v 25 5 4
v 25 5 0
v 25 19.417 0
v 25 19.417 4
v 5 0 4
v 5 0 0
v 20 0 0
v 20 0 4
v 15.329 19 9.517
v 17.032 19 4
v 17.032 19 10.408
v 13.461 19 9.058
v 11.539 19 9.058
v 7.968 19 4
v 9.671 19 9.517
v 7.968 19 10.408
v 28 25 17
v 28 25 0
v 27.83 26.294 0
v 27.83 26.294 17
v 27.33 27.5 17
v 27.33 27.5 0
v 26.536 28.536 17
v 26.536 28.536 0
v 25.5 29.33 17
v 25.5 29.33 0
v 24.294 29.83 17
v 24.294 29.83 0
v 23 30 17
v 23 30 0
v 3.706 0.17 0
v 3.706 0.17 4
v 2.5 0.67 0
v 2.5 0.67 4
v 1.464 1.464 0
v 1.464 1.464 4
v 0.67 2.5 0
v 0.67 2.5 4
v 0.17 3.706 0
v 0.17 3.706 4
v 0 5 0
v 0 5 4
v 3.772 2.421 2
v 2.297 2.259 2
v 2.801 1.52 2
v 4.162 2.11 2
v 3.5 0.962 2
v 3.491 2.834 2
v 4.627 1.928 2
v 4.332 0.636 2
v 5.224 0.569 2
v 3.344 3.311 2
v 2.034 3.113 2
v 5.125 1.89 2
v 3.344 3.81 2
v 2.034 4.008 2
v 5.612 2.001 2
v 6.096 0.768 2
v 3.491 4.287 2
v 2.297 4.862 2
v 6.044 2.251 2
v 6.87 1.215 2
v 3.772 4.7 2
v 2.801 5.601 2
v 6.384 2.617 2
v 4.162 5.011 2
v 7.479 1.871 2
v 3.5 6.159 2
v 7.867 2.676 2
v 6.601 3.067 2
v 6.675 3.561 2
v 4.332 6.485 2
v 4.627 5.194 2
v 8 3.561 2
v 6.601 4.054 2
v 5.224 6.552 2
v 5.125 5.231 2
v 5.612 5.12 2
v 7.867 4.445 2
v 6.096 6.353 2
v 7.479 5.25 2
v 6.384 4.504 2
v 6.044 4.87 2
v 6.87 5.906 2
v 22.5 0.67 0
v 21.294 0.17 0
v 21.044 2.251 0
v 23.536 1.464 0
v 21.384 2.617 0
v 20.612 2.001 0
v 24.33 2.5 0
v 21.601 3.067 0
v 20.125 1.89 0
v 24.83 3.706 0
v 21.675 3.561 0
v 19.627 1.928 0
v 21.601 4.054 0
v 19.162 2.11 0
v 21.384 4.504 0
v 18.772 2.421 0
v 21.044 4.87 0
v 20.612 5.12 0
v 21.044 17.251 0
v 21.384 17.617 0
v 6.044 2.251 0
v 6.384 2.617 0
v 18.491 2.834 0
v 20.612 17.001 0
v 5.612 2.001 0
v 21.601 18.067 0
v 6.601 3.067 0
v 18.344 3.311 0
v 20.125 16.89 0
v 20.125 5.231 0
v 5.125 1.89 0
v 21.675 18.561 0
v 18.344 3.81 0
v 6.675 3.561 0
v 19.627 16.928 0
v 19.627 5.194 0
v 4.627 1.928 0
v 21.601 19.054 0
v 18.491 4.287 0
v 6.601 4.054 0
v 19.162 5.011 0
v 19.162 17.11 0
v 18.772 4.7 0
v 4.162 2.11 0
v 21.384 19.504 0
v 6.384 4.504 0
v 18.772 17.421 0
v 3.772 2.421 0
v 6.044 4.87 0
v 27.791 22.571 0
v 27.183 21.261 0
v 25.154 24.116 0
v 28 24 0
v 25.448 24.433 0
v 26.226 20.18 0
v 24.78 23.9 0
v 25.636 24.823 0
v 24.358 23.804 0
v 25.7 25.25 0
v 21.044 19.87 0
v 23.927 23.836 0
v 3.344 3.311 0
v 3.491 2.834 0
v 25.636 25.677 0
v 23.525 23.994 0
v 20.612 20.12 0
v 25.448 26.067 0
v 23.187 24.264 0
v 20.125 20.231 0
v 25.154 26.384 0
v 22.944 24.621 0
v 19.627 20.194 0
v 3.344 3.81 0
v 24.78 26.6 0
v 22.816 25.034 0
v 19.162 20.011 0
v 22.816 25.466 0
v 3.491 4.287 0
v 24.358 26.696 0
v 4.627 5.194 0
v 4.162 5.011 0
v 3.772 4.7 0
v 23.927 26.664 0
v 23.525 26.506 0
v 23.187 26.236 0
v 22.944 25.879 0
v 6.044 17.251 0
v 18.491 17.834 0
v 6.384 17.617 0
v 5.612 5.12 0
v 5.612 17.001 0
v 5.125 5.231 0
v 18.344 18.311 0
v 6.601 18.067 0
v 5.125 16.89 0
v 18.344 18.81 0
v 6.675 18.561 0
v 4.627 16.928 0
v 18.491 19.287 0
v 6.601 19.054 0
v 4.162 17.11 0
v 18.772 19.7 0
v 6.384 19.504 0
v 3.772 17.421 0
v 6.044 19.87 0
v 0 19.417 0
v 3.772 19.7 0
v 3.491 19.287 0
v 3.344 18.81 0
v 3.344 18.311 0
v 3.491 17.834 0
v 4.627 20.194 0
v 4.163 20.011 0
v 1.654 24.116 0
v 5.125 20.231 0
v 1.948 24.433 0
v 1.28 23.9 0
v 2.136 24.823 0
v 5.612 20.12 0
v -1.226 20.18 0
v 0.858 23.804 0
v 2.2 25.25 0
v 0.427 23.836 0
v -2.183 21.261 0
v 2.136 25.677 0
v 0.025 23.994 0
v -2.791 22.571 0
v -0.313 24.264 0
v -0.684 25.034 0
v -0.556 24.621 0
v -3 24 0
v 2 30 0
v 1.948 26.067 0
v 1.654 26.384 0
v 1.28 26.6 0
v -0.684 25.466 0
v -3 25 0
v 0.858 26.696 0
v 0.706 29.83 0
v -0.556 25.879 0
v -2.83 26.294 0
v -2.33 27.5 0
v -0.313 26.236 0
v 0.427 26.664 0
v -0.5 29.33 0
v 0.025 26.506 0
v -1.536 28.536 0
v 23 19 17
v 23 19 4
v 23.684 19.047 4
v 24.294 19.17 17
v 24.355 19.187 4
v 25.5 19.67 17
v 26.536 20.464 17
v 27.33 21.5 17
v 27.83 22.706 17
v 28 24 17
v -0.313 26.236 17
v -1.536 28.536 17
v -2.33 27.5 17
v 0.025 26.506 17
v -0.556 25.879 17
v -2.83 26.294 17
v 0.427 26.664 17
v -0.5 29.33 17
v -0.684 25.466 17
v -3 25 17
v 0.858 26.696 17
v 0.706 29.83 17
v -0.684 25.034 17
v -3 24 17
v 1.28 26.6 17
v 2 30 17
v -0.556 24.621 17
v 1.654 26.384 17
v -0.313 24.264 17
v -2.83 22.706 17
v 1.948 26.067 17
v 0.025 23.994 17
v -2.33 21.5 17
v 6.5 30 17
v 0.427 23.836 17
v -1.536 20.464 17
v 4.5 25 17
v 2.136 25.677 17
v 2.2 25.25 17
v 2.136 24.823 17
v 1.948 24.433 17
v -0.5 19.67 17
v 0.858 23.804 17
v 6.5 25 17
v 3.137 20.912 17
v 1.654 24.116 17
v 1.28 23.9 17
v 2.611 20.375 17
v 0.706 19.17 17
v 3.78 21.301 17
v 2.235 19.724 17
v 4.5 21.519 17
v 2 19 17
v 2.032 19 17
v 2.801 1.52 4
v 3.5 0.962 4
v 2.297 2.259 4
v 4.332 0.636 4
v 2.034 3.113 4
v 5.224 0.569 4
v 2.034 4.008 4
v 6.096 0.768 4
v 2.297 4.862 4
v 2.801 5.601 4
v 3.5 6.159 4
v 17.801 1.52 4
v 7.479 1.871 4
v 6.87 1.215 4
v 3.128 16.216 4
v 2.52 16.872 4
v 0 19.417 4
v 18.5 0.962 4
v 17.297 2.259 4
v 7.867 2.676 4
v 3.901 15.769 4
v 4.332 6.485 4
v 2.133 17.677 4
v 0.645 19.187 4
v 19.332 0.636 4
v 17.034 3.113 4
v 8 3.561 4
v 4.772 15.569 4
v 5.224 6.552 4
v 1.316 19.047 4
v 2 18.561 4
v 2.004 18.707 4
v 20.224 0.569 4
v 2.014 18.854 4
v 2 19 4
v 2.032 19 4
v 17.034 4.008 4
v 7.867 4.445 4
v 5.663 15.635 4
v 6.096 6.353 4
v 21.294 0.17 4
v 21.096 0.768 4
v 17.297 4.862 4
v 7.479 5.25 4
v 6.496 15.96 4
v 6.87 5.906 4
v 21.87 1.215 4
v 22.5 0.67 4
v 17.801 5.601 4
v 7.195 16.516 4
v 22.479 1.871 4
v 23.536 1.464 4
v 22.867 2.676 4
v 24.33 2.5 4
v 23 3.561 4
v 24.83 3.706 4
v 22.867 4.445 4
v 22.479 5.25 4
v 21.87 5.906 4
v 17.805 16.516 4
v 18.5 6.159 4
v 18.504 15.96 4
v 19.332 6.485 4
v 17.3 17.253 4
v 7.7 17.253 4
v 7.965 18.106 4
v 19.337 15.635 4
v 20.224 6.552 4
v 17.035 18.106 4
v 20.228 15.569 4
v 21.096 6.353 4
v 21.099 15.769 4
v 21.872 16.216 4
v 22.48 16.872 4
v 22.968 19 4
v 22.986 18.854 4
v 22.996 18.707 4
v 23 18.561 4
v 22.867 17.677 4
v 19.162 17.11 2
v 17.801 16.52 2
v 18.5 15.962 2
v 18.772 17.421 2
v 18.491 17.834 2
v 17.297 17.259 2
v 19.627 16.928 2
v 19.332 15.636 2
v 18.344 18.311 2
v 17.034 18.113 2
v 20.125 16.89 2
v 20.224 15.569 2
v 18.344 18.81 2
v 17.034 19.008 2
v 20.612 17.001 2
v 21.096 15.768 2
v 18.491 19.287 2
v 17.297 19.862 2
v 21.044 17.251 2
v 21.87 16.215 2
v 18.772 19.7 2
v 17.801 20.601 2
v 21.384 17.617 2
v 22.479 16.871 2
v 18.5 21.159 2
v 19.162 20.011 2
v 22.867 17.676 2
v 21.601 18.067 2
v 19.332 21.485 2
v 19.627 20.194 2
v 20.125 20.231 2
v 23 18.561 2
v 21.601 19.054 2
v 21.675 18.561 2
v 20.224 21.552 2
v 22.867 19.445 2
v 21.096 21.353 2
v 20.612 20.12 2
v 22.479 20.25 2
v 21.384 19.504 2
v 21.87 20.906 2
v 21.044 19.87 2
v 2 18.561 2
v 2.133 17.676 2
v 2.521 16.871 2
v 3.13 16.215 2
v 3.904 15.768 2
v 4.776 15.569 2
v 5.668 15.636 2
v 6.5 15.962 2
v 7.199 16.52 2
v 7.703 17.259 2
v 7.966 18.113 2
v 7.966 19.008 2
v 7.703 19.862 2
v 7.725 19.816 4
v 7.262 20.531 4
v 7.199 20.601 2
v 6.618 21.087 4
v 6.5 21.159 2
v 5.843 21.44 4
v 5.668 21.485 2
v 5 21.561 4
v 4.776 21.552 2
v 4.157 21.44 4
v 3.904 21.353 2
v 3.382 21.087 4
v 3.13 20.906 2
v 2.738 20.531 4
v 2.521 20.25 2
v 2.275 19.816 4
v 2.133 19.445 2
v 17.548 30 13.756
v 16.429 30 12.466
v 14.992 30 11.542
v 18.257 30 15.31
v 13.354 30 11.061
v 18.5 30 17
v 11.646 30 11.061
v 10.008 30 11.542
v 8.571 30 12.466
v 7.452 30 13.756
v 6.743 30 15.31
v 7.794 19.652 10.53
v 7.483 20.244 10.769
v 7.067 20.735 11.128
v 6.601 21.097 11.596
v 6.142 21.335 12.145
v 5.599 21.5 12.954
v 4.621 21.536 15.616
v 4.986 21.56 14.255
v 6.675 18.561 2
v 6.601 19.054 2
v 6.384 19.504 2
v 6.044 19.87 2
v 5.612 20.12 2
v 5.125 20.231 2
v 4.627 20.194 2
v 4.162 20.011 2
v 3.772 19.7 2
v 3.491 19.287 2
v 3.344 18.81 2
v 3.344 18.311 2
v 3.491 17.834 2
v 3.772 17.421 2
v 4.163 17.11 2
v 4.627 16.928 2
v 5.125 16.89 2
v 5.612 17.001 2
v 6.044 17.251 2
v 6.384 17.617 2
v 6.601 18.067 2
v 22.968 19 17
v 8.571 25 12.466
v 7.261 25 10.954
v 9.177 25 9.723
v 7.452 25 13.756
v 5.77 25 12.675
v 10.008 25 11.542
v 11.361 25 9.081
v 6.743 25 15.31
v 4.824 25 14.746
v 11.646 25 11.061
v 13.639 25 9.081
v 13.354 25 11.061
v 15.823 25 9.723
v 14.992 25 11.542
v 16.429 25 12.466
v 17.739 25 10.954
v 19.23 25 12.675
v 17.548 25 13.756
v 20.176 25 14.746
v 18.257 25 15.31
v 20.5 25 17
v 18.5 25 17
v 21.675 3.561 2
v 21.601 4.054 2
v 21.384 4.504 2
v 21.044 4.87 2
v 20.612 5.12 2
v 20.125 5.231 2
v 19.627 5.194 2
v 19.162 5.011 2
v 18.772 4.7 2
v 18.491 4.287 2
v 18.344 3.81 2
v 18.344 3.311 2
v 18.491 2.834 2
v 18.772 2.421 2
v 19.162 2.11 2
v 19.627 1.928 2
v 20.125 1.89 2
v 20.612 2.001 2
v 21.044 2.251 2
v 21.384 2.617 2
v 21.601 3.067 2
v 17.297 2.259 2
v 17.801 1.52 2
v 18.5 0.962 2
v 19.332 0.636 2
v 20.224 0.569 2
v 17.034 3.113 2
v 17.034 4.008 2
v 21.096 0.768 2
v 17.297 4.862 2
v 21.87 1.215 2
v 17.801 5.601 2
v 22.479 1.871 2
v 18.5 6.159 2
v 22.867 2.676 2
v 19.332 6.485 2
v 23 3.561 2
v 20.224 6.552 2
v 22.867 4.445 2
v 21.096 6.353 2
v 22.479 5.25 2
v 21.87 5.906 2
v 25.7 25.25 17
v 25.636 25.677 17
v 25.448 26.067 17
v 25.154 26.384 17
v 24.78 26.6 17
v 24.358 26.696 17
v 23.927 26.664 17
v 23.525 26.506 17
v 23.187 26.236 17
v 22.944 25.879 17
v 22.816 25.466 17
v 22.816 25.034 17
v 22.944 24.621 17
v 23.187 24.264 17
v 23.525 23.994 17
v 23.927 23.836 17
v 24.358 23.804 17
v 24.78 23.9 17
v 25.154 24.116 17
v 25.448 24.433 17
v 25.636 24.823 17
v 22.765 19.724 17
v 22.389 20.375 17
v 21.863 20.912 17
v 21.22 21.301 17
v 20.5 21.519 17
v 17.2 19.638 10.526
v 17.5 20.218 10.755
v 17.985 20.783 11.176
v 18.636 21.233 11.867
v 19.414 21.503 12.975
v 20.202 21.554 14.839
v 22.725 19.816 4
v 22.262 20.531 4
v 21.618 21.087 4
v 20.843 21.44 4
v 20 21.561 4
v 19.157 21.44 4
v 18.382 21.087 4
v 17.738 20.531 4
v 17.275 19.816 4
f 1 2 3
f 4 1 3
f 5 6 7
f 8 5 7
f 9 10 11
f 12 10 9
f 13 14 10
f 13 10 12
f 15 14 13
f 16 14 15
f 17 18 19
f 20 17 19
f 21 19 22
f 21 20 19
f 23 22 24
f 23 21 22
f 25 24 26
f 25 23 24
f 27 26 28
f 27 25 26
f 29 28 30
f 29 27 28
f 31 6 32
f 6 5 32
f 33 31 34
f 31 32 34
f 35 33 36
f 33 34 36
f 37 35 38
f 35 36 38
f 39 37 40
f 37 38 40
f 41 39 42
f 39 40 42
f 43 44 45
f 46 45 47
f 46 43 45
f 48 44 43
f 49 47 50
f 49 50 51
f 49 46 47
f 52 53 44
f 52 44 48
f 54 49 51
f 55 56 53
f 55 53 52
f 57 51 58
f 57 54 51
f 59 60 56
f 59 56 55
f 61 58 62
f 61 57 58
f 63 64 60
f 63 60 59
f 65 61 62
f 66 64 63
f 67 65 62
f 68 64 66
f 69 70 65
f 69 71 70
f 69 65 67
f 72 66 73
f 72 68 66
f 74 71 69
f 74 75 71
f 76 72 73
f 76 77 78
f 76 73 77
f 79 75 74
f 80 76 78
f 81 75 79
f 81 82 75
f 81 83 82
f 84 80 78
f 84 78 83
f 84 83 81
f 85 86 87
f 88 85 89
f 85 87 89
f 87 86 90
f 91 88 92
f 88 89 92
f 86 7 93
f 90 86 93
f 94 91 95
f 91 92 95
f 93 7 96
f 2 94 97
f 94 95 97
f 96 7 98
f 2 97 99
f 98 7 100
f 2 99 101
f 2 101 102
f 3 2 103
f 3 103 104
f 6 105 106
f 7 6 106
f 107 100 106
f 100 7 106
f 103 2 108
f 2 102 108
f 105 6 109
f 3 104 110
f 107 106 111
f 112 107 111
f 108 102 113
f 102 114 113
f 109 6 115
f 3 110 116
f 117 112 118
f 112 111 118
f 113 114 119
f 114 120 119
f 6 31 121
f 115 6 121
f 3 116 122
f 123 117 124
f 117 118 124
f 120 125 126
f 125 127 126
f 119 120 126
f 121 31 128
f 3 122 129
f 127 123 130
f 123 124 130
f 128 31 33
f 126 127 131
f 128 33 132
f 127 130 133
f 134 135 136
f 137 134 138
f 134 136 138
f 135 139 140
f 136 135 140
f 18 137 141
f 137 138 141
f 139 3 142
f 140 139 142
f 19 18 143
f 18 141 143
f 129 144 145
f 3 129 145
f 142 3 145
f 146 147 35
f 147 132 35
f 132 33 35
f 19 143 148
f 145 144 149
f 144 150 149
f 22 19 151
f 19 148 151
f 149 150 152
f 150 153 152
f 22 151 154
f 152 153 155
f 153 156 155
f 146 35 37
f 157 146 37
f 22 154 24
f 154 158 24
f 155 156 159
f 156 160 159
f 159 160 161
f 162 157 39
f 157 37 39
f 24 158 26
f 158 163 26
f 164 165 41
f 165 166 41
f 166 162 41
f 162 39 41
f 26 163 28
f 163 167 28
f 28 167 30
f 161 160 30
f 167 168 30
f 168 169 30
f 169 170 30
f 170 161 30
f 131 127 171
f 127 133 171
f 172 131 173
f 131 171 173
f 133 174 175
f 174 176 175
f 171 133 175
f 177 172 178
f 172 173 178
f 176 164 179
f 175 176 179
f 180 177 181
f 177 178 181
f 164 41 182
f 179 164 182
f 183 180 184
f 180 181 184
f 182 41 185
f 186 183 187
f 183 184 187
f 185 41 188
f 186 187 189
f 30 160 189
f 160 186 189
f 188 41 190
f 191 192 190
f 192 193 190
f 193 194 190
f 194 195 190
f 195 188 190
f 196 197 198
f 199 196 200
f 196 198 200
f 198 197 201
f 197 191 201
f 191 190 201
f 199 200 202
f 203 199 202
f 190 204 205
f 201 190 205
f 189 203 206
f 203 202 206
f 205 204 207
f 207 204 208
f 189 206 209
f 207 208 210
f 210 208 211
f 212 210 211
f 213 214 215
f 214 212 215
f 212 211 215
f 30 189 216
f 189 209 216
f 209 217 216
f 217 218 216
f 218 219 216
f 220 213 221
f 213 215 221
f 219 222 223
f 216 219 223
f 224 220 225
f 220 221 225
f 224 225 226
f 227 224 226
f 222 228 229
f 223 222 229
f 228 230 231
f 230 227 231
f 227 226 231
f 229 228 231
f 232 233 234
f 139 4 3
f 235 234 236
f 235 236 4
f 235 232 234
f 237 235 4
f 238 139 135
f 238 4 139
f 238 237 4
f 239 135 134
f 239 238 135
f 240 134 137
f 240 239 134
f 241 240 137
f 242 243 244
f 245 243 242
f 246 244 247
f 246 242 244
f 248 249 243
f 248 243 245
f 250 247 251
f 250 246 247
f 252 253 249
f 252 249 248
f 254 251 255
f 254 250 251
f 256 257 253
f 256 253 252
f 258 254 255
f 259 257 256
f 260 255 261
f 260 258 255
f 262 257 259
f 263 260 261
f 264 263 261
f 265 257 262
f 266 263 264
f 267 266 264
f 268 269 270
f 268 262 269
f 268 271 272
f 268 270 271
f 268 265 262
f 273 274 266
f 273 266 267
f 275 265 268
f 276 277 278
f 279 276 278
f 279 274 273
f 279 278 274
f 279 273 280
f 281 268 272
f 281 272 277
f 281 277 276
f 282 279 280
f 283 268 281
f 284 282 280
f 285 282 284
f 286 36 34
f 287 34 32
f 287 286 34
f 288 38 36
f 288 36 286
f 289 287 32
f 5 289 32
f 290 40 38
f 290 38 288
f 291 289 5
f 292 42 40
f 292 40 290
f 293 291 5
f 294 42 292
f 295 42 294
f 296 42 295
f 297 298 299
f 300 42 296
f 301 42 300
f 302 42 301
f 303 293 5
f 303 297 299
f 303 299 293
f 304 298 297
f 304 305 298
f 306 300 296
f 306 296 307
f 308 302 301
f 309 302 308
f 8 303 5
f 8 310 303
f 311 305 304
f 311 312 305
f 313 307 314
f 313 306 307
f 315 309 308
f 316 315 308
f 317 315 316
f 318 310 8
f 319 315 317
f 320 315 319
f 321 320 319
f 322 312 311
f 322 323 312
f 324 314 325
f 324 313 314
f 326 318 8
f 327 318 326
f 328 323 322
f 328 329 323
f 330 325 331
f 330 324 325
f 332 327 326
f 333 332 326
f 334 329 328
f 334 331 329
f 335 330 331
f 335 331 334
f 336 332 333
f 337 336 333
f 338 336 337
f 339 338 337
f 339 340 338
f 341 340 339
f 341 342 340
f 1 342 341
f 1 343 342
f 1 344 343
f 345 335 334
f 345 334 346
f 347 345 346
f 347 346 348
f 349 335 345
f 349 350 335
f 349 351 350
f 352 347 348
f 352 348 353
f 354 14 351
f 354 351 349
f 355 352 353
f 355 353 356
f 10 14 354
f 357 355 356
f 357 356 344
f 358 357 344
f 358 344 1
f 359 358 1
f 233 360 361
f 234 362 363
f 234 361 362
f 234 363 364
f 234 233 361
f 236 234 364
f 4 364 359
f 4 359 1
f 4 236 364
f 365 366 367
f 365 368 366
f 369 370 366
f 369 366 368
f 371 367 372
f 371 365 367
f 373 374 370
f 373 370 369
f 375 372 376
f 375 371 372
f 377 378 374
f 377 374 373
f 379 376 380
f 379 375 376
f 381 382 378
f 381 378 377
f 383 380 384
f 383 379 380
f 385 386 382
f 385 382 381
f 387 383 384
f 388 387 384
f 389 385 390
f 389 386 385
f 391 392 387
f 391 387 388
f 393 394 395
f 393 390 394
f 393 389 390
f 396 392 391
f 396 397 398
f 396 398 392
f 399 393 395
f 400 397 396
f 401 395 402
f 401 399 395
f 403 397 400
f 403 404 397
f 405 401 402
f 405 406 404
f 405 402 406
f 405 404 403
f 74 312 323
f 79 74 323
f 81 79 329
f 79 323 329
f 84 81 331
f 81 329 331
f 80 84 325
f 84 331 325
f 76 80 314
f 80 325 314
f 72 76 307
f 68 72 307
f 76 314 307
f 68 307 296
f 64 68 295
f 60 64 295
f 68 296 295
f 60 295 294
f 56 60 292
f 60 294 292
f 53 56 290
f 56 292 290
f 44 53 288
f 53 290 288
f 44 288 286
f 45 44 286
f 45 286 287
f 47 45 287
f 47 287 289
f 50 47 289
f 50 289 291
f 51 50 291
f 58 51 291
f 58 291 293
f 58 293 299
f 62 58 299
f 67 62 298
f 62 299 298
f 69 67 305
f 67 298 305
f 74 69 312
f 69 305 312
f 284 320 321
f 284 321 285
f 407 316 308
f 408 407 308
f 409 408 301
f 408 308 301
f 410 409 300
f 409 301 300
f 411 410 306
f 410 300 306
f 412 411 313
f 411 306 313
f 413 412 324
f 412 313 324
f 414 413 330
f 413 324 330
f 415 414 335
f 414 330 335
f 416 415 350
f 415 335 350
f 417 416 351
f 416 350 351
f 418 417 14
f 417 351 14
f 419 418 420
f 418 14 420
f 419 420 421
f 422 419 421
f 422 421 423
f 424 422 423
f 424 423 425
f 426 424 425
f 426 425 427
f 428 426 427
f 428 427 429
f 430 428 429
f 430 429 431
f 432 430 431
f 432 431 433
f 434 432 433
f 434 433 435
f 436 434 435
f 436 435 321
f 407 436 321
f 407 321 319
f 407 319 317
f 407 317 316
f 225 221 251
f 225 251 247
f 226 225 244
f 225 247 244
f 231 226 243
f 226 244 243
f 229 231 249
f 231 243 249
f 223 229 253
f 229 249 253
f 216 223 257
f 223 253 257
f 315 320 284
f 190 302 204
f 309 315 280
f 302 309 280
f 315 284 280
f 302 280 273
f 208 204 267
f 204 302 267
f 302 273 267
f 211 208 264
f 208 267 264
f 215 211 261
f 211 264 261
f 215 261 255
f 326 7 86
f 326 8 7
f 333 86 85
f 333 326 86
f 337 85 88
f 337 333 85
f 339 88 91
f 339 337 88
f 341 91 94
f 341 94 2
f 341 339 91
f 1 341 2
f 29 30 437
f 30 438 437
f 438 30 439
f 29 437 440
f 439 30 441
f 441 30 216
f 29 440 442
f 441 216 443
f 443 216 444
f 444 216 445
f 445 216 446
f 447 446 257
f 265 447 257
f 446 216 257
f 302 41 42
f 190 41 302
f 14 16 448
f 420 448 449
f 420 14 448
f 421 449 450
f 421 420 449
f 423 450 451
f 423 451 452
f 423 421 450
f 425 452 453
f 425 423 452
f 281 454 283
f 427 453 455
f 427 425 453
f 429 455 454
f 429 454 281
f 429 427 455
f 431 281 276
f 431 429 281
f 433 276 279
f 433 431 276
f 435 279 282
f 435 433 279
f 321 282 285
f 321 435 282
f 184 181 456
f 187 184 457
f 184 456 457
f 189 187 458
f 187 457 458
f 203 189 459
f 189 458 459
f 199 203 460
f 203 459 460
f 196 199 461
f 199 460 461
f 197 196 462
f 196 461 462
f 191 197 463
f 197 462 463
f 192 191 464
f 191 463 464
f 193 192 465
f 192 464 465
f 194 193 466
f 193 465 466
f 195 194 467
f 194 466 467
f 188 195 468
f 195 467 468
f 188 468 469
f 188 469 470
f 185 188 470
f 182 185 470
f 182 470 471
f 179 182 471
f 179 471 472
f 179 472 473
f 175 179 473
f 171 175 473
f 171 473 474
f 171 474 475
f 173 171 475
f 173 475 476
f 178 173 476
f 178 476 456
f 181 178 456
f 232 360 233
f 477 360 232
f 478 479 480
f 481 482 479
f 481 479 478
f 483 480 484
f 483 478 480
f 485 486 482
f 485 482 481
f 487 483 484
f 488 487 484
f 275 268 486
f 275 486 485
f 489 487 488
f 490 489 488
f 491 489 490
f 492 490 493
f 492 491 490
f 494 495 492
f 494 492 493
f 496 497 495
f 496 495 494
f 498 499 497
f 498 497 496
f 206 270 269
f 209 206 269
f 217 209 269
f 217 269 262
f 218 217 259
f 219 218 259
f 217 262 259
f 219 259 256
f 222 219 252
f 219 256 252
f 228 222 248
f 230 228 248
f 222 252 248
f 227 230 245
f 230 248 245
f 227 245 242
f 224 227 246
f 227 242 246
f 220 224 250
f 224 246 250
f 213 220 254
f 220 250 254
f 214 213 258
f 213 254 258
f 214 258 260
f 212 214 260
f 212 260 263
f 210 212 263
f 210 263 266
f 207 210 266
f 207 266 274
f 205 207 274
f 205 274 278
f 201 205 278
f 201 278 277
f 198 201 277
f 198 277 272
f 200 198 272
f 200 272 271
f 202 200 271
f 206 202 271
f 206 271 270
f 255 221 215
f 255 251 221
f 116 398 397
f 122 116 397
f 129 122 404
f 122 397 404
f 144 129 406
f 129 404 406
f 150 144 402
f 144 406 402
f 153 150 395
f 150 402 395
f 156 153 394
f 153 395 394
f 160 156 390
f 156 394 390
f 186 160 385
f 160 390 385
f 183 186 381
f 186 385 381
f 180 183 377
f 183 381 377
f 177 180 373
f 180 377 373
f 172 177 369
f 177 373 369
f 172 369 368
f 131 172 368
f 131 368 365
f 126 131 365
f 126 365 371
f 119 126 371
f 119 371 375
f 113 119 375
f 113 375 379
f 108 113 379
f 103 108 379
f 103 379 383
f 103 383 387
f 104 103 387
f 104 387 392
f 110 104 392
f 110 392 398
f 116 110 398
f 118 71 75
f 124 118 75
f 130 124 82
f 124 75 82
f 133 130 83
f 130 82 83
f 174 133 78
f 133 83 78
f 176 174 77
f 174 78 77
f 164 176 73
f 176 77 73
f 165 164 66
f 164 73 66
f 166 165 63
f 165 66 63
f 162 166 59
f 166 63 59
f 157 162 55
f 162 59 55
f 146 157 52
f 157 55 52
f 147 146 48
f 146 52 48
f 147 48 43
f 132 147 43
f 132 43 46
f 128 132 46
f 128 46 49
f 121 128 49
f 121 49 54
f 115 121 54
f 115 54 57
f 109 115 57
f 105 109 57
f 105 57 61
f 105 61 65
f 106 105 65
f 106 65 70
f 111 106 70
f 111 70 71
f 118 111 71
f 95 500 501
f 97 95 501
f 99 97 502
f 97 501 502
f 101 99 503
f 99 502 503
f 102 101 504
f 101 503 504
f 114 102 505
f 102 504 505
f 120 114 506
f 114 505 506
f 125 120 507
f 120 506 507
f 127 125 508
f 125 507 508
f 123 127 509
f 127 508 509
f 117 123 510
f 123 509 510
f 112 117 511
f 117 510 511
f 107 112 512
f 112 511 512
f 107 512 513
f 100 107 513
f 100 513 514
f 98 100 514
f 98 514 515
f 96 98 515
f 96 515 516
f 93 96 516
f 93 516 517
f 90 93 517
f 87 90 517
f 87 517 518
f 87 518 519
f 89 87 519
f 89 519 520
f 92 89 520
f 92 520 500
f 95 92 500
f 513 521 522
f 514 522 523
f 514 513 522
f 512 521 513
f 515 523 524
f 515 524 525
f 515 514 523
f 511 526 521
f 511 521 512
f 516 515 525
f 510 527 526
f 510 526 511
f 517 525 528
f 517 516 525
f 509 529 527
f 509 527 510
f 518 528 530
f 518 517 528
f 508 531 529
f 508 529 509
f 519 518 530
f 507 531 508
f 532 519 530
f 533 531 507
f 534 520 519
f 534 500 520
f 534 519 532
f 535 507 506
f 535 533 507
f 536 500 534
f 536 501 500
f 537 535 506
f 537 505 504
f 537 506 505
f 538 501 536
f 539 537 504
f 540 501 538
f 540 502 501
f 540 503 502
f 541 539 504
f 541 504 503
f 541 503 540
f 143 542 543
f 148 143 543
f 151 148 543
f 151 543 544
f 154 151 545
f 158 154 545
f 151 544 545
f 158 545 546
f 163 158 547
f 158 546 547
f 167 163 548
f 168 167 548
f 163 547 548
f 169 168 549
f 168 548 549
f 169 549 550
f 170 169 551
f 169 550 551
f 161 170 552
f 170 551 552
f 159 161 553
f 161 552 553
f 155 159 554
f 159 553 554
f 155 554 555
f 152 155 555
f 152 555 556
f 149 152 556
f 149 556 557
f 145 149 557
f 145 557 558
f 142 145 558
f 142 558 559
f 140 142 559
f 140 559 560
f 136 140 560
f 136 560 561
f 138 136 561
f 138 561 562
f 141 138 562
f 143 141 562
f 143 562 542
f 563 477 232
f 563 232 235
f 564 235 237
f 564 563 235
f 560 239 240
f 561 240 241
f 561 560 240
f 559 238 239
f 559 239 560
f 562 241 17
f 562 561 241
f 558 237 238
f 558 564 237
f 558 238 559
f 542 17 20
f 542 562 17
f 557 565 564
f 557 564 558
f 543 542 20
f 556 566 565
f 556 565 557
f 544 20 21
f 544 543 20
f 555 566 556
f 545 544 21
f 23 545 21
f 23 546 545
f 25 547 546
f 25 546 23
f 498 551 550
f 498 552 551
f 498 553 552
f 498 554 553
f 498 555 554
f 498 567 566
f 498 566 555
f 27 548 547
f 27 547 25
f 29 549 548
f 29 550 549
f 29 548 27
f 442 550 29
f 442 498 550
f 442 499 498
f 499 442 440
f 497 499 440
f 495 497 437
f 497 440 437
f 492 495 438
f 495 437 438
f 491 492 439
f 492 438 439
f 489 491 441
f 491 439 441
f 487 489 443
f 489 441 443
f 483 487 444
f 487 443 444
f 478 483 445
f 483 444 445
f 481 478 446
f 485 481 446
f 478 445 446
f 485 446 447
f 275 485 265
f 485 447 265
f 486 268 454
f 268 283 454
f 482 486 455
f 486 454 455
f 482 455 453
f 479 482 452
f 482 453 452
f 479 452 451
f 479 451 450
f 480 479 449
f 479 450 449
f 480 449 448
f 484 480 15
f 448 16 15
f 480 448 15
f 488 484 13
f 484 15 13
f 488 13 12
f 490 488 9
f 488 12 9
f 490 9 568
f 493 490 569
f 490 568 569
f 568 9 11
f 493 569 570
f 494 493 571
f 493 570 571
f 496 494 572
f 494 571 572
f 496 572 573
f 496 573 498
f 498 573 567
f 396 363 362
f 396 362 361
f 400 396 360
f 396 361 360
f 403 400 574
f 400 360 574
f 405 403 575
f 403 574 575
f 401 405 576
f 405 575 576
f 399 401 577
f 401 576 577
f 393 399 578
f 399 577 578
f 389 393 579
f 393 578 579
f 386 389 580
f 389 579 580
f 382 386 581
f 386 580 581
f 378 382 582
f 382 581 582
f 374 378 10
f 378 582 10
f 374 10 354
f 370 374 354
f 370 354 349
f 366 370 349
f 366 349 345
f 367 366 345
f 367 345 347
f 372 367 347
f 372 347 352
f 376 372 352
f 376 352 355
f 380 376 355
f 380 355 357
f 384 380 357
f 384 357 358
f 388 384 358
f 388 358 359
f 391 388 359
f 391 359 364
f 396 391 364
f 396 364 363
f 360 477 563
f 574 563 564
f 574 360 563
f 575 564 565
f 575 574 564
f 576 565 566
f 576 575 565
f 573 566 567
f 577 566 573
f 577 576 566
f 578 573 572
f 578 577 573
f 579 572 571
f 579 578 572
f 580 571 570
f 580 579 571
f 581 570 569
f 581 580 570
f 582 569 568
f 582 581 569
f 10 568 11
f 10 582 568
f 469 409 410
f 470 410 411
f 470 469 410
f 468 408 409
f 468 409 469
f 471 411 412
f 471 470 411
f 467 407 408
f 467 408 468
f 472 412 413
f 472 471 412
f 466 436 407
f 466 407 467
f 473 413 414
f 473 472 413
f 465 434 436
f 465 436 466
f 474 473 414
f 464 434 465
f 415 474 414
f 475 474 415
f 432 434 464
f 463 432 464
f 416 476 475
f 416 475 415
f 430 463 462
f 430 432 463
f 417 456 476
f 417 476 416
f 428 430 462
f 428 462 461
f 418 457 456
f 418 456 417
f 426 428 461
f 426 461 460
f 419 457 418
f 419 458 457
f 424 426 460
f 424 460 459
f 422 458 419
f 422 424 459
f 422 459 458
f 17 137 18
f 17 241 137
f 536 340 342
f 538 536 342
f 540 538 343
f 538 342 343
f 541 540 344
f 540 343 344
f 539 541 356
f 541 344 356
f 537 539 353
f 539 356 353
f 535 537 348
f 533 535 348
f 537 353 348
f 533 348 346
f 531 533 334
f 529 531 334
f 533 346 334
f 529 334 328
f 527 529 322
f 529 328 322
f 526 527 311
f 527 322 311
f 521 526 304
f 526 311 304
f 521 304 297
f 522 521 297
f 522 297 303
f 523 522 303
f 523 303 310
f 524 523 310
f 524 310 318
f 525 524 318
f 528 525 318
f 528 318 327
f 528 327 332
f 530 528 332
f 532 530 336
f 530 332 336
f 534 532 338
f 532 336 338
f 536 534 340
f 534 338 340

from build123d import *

# Parameters (mm, degrees)
F0_W      = 25
F0_H      = 30
F1_DEPTH  = 4
F2_R      = 1.675
F3_DEPTH  = 25
F4_W      = 25
F4_H      = 11
F5_DEPTH  = 13
F7_DEPTH  = 6
F8_R      = 8
F9_DEPTH  = 6
F2_R_2    = 3
F10_DEPTH = 2
F11_W     = 11
F11_H     = 17
F12_DEPTH = 3
F13_R     = 5
F14_W     = 11
F14_H     = 17
F15_DEPTH = 3
F16_R     = 1.45
F17_DEPTH = 25
F18_R     = 5
F19_DEPTH = 25


with BuildPart() as f1:
    # F0 (on Top) → F1 (new body)
    with BuildSketch(Plane.XY):
        with Locations((12.5, 15)):
            Rectangle(F0_W, F0_H)
    extrude(amount=F1_DEPTH)

    # F2 (on face) → F3 (cut)
    with BuildSketch(Plane.XY.offset(4)):
        with BuildLine():
            ThreePointArc((3.325, 18.5605346784), (5, 16.8855346784), (6.675, 18.5605346784))
            ThreePointArc((6.675, 18.5605346784), (5, 20.2355346784), (3.325, 18.5605346784))
        make_face()
        with Locations((20, 18.5605346784)):
            Circle(F2_R)
        with Locations((20, 3.5605346784)):
            Circle(F2_R)
        with Locations((5, 3.5605346784)):
            Circle(F2_R)
    extrude(amount=-F3_DEPTH, mode=Mode.SUBTRACT)

    # F4 (on face) → F5 (join)
    with BuildSketch(Plane.XY.offset(4)):
        with Locations((12.5, 24.5)):
            Rectangle(F4_W, F4_H)
    extrude(amount=F5_DEPTH)

    # F6 (on face) → F7 (cut)
    with BuildSketch(Plane(origin=(0, 30, 0), x_dir=(-1, 0, 0), z_dir=(0, 1, 0))):
        with BuildLine():
            ThreePointArc((-18.5, 17), (-12.5, 11), (-6.5, 17))
            Line((-6.5, 17), (-18.5, 17))
        make_face()
    extrude(amount=-F7_DEPTH, mode=Mode.SUBTRACT)

    # F8 (on face) → F9 (cut)
    with BuildSketch(Plane.XZ.offset(-19)):
        with Locations((12.5, 17)):
            Circle(F8_R)
    extrude(amount=-F9_DEPTH, mode=Mode.SUBTRACT)

    # F2 (on face) → F10 (cut)
    with BuildSketch(Plane.XY.offset(4)):
        with BuildLine():
            ThreePointArc((8, 18.5605346784), (5, 21.5605346784), (2, 18.5605346784))
            ThreePointArc((2, 18.5605346784), (5, 15.5605346784), (8, 18.5605346784))
        make_face()
        with BuildLine():
            ThreePointArc((3.325, 18.5605346784), (5, 20.2355346784), (6.675, 18.5605346784))
            ThreePointArc((6.675, 18.5605346784), (5, 16.8855346784), (3.325, 18.5605346784))
        make_face(mode=Mode.SUBTRACT)
        with Locations((20, 18.5605346784)):
            Circle(F2_R_2)
        with Locations((20, 18.5605346784)):
            Circle(F2_R, mode=Mode.SUBTRACT)
        with Locations((20, 3.5605346784)):
            Circle(F2_R_2)
        with Locations((20, 3.5605346784)):
            Circle(F2_R, mode=Mode.SUBTRACT)
        with Locations((5, 3.5605346784)):
            Circle(F2_R_2)
        with Locations((5, 3.5605346784)):
            Circle(F2_R, mode=Mode.SUBTRACT)
    extrude(amount=-F10_DEPTH, mode=Mode.SUBTRACT)

    # F11 (on face) → F12 (join)
    with BuildSketch(Plane(origin=(0, 0, 0), x_dir=(0, -1, 0), z_dir=(-1, 0, 0))):
        with Locations((-24.5, 8.5)):
            Rectangle(F11_W, F11_H)
    extrude(amount=F12_DEPTH)

    # F13
    f13_edges = [f1.edges().sort_by_distance(p)[0] for p in [
        (0, 0, 2),
        (25, 0, 2),
    ]]
    fillet(f13_edges, radius=F13_R)

    # F14 (on face) → F15 (join)
    with BuildSketch(Plane.YZ.offset(25)):
        with Locations((24.5, 8.5)):
            Rectangle(F14_W, F14_H)
    extrude(amount=F15_DEPTH)

    # F16 (on face) → F17 (cut)
    with BuildSketch(Plane.XY.offset(17)):
        with Locations((0.7500000062, 25.25)):
            Circle(F16_R)
        with Locations((24.2500000062, 25.25)):
            Circle(F16_R)
    extrude(amount=-F17_DEPTH, mode=Mode.SUBTRACT)

    # F18
    f18_edges = [f1.edges().sort_by_distance(p)[0] for p in [
        (-3, 19, 8.5),
        (28, 19, 8.5),
        (28, 30, 8.5),
        (-3, 30, 8.5),
    ]]
    fillet(f18_edges, radius=F18_R)

    # F2 (on face) → F19 (cut)
    with BuildSketch(Plane.XY.offset(4)):
        with BuildLine():
            ThreePointArc((8, 18.5605346784), (5, 21.5605346784), (2, 18.5605346784))
            ThreePointArc((2, 18.5605346784), (5, 15.5605346784), (8, 18.5605346784))
        make_face()
        with BuildLine():
            ThreePointArc((3.325, 18.5605346784), (5, 20.2355346784), (6.675, 18.5605346784))
            ThreePointArc((6.675, 18.5605346784), (5, 16.8855346784), (3.325, 18.5605346784))
        make_face(mode=Mode.SUBTRACT)
        with Locations((20, 18.5605346784)):
            Circle(F2_R_2)
        with Locations((20, 18.5605346784)):
            Circle(F2_R, mode=Mode.SUBTRACT)
        with BuildLine():
            ThreePointArc((3.325, 18.5605346784), (5, 16.8855346784), (6.675, 18.5605346784))
            ThreePointArc((6.675, 18.5605346784), (5, 20.2355346784), (3.325, 18.5605346784))
        make_face()
        with Locations((20, 18.5605346784)):
            Circle(F2_R)
    extrude(amount=F19_DEPTH, mode=Mode.SUBTRACT)


solid = f1.part
